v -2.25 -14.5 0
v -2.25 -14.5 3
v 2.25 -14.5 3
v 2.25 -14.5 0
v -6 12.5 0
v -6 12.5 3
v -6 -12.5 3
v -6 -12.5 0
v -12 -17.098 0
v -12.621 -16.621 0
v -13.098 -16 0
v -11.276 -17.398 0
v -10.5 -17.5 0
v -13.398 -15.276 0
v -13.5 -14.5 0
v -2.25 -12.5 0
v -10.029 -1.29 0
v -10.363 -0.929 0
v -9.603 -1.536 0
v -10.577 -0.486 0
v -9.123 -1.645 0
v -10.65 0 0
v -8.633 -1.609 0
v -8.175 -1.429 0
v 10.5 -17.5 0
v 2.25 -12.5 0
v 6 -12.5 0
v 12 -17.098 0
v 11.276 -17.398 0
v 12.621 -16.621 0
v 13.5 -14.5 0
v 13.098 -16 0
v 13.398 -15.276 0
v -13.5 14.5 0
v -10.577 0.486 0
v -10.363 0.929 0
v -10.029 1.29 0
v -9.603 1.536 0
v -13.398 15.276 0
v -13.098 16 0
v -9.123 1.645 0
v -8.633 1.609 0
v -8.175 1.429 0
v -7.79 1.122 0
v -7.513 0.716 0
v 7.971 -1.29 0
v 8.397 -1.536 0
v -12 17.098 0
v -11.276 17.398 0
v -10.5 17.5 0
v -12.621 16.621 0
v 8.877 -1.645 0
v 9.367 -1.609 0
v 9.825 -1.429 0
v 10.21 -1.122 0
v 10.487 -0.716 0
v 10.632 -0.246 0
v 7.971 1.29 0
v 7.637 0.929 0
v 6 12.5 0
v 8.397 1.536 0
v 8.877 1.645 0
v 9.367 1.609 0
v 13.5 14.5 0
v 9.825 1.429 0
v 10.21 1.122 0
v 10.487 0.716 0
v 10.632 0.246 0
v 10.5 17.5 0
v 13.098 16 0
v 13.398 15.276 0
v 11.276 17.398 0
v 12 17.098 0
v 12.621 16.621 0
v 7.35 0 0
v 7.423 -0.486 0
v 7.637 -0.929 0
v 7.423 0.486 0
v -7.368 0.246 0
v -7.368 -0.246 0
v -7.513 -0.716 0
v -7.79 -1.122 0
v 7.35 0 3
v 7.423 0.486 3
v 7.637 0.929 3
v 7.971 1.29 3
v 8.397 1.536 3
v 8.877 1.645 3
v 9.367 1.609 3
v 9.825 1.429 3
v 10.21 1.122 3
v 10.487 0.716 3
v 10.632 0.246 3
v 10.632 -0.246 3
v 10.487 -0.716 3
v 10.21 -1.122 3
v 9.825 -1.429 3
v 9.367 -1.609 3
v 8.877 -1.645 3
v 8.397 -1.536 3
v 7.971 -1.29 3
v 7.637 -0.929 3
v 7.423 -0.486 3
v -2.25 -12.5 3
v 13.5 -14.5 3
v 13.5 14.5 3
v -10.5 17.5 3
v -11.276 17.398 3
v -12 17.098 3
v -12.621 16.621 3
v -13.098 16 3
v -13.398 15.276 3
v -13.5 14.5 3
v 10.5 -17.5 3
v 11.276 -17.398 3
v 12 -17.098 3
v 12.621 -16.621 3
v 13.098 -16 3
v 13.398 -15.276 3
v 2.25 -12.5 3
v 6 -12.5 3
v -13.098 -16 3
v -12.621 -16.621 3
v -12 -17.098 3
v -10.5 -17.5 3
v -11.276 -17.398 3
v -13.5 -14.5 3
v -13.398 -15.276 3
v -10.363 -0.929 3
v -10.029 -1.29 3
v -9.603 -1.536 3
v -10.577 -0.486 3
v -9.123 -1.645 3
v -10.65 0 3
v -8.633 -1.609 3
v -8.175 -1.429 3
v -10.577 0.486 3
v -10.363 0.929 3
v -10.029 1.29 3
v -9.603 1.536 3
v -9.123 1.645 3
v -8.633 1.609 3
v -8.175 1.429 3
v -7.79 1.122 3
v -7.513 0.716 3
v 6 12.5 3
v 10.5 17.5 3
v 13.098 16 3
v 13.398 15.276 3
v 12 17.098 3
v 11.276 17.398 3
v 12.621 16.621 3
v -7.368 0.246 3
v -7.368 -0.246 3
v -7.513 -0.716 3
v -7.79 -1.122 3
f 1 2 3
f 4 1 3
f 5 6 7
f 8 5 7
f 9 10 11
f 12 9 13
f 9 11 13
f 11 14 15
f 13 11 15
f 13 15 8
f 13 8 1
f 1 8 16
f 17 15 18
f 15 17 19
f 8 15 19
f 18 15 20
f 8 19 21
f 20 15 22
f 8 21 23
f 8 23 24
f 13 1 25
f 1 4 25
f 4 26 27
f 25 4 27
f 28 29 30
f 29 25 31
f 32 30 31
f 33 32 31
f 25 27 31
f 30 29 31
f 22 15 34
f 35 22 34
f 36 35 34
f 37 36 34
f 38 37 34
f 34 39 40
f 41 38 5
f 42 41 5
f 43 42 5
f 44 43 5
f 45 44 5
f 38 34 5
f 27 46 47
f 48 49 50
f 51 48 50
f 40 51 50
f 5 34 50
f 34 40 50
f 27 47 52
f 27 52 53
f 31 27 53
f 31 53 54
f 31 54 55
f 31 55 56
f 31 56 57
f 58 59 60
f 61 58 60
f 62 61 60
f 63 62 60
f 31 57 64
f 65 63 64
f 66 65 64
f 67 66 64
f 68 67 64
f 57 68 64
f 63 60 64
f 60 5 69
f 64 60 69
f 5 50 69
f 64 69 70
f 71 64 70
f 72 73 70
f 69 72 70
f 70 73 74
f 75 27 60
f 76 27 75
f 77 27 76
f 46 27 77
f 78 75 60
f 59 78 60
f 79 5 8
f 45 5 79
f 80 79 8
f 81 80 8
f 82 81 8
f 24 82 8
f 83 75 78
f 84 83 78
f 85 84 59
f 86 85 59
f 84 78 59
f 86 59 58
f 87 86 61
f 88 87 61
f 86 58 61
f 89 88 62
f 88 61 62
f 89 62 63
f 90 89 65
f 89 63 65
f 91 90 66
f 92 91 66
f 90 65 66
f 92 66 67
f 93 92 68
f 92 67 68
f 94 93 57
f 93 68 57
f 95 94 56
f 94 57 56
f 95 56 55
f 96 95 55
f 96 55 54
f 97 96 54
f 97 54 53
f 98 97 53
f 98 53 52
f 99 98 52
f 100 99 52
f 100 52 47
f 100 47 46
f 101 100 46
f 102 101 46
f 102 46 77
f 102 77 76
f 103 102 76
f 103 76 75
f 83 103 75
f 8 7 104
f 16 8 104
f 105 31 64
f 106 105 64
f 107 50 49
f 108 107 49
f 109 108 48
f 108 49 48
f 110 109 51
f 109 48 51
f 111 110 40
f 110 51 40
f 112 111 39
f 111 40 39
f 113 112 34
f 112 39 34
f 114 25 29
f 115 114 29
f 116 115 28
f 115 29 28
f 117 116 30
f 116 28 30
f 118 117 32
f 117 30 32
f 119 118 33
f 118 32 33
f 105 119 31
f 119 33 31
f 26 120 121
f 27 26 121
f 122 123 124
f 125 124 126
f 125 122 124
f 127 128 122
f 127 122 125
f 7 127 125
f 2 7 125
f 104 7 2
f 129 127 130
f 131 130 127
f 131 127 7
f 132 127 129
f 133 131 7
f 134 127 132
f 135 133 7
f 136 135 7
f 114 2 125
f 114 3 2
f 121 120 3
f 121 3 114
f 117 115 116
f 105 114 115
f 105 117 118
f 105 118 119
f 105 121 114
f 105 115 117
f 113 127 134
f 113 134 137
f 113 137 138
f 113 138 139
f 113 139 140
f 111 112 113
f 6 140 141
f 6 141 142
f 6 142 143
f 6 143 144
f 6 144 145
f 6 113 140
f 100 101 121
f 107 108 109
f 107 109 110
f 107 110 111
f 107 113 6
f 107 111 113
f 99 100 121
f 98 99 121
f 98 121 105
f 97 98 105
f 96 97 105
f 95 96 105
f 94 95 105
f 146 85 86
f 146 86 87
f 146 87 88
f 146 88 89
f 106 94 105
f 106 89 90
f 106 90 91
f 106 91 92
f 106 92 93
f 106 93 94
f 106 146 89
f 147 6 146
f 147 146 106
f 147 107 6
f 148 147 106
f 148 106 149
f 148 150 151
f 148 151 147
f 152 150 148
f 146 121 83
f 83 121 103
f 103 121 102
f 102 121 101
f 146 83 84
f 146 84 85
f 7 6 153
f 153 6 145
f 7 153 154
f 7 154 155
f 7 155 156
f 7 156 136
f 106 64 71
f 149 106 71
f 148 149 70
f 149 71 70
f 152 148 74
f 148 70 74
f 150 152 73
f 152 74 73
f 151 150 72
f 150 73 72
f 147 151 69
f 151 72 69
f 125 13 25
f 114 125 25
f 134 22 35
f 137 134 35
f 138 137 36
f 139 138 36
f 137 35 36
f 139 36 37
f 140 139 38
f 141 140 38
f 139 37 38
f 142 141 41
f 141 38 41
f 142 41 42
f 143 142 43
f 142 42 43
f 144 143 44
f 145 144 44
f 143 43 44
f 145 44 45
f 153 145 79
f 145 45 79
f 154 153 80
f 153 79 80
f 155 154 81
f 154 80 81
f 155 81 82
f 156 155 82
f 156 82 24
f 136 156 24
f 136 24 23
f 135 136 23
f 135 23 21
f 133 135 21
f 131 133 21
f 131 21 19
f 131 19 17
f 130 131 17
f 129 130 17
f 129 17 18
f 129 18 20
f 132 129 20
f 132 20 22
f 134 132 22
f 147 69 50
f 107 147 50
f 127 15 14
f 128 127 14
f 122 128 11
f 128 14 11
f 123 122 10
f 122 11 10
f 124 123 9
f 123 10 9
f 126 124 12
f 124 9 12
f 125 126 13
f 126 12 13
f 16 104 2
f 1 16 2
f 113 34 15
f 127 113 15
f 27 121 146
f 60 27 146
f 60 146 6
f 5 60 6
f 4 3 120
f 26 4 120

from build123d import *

# Parameters (mm, degrees)
F1_DEPTH = 3
F3_D     = 3.3
F5_DEPTH = 25


with BuildPart() as f1:
    # F0 (on Top) → F1 (new body)
    with BuildSketch(Plane.XY):
        with BuildLine():
            Line((10.5, 17.5), (-10.5, 17.5))
            ThreePointArc((-10.5, 17.5), (-12.62132, 16.62132), (-13.5, 14.5))
            Line((-13.5, 14.5), (-13.5, -14.5))
            ThreePointArc((-13.5, -14.5), (-12.62132, -16.62132), (-10.5, -17.5))
            Line((-10.5, -17.5), (10.5, -17.5))
            ThreePointArc((10.5, -17.5), (12.62132, -16.62132), (13.5, -14.5))
            Line((13.5, -14.5), (13.5, 14.5))
            ThreePointArc((13.5, 14.5), (12.62132, 16.62132), (10.5, 17.5))
        make_face()
    extrude(amount=F1_DEPTH)

    # F3 (through all)
    with Locations(Plane.XY.offset(3)):
        with Locations((-9, 0), (9, 0)):
            Hole(F3_D / 2)

    # F4 (on face) → F5 (cut)
    with BuildSketch(Plane.XY.offset(3)):
        Polygon((6, 12.5), (-6, 12.5), (-6, -12.5), (-2.25, -12.5), (-2.25, -14.5), (2.25, -14.5), (2.25, -12.5), (6, -12.5), align=None)
    extrude(amount=-F5_DEPTH, mode=Mode.SUBTRACT)


solid = f1.part
